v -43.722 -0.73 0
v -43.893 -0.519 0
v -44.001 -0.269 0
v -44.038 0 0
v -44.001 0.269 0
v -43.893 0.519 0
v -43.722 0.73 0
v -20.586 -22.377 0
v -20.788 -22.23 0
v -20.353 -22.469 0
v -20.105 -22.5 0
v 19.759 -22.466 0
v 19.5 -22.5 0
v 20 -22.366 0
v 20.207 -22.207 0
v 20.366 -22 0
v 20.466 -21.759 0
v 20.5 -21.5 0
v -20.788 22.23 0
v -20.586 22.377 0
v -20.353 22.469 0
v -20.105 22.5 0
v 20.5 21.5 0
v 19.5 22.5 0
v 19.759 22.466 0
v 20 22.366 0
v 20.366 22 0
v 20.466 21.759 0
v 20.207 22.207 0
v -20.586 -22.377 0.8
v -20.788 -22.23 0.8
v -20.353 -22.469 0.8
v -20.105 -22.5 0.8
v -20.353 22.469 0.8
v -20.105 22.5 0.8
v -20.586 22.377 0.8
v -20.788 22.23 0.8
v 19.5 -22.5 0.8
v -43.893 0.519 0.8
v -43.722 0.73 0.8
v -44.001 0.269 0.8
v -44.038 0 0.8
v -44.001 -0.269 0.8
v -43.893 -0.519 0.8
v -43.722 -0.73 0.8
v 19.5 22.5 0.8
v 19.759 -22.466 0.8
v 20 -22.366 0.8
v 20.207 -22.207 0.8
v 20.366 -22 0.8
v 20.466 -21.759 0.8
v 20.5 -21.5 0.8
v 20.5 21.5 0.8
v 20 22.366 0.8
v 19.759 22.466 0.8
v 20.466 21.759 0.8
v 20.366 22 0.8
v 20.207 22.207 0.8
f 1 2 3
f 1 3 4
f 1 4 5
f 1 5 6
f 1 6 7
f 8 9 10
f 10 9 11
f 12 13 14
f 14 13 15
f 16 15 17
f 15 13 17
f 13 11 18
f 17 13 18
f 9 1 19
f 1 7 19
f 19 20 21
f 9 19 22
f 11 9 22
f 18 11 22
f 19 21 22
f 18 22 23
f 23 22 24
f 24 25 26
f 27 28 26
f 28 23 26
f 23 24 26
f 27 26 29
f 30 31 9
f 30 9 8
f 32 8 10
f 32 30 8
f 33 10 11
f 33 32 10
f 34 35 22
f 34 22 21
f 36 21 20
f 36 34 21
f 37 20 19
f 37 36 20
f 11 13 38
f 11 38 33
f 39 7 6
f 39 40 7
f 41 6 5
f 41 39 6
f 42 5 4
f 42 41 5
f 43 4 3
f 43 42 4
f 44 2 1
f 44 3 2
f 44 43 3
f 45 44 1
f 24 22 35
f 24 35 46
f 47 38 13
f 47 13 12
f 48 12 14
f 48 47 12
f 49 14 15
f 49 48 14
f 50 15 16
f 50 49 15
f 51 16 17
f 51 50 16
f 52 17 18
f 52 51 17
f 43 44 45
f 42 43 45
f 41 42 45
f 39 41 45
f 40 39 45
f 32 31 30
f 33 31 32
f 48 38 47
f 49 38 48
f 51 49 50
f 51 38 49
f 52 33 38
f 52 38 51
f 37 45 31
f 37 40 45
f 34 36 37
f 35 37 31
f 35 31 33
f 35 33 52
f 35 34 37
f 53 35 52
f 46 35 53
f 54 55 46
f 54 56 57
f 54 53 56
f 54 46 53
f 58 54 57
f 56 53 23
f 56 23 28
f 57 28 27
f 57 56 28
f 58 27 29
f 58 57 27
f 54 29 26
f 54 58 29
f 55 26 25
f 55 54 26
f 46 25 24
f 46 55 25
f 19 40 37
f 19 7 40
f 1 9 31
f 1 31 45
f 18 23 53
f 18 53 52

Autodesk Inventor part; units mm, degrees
ref_plane "YZ Plane" through (0, 0, 0) normal (1, 0, 0) x (0, 1, 0)
ref_plane "XZ Plane" through (0, 0, 0) normal (0, 1, 0) x (-1, 0, 0)
ref_plane "XY Plane" through (0, 0, 0) normal (0, 0, 1) x (1, 0, 0)
sketch "Sketch1" plane through (0, 0, 0) normal (0, 0, 1) x (1, 0, 0)
  line L0 (-20.5, 22.5) -> (20.5, 22.5)
  line L1 (20.5, 22.5) -> (20.5, -22.5)
  line L2 (20.5, -22.5) -> (-20.5, -22.5)
  line L3 (-20.5, -22.5) -> (-20.5, 22.5) construction
  line L4 (-20.5, 22.5) -> (20.5, -22.5) construction
  line L5 (-20.5, -22.5) -> (-44.5, 0)
  line L6 (-44.5, 0) -> (-20.5, 22.5)
  point P0 (0, 0)
  point P1 (0, 0)
  point P2 (20.5, 0)
  dimension "d0" = 41
  dimension "d1" = 45
  dimension "d4" = 65
extrude "Plate1" add sketch "Sketch1" along normal blind 0.8
fillet "Corner Round2" radius 1 5 edges at (-20.5, -22.5, 0.4) (-44.5, 0, 0.4) (-20.5, 22.5, 0.4) (20.5, -22.5, 0.4) (20.5, 22.5, 0.4)
equation "\"d2\" = Thickness"
equation "\"BendReliefWidth\" = Thickness"
equation "\"BendReliefDepth\" = 0.5 * Thickness"
equation "\"CornerReliefSize\" = 4 * Thickness"
equation "\"MinimumRemnant\" = 2 * Thickness"
equation "\"TransitionRadius\" = BendRadius"
equation "\"JacobiRadiusSize\" = BendRadius"
equation "\"GapSize\" = Thickness"
equation "\"Thickness\" = 0.8"
equation "\"BendRadius\" = 2.75"
properties part number "DSB-508 CAP house" material "Stainless Steel"
